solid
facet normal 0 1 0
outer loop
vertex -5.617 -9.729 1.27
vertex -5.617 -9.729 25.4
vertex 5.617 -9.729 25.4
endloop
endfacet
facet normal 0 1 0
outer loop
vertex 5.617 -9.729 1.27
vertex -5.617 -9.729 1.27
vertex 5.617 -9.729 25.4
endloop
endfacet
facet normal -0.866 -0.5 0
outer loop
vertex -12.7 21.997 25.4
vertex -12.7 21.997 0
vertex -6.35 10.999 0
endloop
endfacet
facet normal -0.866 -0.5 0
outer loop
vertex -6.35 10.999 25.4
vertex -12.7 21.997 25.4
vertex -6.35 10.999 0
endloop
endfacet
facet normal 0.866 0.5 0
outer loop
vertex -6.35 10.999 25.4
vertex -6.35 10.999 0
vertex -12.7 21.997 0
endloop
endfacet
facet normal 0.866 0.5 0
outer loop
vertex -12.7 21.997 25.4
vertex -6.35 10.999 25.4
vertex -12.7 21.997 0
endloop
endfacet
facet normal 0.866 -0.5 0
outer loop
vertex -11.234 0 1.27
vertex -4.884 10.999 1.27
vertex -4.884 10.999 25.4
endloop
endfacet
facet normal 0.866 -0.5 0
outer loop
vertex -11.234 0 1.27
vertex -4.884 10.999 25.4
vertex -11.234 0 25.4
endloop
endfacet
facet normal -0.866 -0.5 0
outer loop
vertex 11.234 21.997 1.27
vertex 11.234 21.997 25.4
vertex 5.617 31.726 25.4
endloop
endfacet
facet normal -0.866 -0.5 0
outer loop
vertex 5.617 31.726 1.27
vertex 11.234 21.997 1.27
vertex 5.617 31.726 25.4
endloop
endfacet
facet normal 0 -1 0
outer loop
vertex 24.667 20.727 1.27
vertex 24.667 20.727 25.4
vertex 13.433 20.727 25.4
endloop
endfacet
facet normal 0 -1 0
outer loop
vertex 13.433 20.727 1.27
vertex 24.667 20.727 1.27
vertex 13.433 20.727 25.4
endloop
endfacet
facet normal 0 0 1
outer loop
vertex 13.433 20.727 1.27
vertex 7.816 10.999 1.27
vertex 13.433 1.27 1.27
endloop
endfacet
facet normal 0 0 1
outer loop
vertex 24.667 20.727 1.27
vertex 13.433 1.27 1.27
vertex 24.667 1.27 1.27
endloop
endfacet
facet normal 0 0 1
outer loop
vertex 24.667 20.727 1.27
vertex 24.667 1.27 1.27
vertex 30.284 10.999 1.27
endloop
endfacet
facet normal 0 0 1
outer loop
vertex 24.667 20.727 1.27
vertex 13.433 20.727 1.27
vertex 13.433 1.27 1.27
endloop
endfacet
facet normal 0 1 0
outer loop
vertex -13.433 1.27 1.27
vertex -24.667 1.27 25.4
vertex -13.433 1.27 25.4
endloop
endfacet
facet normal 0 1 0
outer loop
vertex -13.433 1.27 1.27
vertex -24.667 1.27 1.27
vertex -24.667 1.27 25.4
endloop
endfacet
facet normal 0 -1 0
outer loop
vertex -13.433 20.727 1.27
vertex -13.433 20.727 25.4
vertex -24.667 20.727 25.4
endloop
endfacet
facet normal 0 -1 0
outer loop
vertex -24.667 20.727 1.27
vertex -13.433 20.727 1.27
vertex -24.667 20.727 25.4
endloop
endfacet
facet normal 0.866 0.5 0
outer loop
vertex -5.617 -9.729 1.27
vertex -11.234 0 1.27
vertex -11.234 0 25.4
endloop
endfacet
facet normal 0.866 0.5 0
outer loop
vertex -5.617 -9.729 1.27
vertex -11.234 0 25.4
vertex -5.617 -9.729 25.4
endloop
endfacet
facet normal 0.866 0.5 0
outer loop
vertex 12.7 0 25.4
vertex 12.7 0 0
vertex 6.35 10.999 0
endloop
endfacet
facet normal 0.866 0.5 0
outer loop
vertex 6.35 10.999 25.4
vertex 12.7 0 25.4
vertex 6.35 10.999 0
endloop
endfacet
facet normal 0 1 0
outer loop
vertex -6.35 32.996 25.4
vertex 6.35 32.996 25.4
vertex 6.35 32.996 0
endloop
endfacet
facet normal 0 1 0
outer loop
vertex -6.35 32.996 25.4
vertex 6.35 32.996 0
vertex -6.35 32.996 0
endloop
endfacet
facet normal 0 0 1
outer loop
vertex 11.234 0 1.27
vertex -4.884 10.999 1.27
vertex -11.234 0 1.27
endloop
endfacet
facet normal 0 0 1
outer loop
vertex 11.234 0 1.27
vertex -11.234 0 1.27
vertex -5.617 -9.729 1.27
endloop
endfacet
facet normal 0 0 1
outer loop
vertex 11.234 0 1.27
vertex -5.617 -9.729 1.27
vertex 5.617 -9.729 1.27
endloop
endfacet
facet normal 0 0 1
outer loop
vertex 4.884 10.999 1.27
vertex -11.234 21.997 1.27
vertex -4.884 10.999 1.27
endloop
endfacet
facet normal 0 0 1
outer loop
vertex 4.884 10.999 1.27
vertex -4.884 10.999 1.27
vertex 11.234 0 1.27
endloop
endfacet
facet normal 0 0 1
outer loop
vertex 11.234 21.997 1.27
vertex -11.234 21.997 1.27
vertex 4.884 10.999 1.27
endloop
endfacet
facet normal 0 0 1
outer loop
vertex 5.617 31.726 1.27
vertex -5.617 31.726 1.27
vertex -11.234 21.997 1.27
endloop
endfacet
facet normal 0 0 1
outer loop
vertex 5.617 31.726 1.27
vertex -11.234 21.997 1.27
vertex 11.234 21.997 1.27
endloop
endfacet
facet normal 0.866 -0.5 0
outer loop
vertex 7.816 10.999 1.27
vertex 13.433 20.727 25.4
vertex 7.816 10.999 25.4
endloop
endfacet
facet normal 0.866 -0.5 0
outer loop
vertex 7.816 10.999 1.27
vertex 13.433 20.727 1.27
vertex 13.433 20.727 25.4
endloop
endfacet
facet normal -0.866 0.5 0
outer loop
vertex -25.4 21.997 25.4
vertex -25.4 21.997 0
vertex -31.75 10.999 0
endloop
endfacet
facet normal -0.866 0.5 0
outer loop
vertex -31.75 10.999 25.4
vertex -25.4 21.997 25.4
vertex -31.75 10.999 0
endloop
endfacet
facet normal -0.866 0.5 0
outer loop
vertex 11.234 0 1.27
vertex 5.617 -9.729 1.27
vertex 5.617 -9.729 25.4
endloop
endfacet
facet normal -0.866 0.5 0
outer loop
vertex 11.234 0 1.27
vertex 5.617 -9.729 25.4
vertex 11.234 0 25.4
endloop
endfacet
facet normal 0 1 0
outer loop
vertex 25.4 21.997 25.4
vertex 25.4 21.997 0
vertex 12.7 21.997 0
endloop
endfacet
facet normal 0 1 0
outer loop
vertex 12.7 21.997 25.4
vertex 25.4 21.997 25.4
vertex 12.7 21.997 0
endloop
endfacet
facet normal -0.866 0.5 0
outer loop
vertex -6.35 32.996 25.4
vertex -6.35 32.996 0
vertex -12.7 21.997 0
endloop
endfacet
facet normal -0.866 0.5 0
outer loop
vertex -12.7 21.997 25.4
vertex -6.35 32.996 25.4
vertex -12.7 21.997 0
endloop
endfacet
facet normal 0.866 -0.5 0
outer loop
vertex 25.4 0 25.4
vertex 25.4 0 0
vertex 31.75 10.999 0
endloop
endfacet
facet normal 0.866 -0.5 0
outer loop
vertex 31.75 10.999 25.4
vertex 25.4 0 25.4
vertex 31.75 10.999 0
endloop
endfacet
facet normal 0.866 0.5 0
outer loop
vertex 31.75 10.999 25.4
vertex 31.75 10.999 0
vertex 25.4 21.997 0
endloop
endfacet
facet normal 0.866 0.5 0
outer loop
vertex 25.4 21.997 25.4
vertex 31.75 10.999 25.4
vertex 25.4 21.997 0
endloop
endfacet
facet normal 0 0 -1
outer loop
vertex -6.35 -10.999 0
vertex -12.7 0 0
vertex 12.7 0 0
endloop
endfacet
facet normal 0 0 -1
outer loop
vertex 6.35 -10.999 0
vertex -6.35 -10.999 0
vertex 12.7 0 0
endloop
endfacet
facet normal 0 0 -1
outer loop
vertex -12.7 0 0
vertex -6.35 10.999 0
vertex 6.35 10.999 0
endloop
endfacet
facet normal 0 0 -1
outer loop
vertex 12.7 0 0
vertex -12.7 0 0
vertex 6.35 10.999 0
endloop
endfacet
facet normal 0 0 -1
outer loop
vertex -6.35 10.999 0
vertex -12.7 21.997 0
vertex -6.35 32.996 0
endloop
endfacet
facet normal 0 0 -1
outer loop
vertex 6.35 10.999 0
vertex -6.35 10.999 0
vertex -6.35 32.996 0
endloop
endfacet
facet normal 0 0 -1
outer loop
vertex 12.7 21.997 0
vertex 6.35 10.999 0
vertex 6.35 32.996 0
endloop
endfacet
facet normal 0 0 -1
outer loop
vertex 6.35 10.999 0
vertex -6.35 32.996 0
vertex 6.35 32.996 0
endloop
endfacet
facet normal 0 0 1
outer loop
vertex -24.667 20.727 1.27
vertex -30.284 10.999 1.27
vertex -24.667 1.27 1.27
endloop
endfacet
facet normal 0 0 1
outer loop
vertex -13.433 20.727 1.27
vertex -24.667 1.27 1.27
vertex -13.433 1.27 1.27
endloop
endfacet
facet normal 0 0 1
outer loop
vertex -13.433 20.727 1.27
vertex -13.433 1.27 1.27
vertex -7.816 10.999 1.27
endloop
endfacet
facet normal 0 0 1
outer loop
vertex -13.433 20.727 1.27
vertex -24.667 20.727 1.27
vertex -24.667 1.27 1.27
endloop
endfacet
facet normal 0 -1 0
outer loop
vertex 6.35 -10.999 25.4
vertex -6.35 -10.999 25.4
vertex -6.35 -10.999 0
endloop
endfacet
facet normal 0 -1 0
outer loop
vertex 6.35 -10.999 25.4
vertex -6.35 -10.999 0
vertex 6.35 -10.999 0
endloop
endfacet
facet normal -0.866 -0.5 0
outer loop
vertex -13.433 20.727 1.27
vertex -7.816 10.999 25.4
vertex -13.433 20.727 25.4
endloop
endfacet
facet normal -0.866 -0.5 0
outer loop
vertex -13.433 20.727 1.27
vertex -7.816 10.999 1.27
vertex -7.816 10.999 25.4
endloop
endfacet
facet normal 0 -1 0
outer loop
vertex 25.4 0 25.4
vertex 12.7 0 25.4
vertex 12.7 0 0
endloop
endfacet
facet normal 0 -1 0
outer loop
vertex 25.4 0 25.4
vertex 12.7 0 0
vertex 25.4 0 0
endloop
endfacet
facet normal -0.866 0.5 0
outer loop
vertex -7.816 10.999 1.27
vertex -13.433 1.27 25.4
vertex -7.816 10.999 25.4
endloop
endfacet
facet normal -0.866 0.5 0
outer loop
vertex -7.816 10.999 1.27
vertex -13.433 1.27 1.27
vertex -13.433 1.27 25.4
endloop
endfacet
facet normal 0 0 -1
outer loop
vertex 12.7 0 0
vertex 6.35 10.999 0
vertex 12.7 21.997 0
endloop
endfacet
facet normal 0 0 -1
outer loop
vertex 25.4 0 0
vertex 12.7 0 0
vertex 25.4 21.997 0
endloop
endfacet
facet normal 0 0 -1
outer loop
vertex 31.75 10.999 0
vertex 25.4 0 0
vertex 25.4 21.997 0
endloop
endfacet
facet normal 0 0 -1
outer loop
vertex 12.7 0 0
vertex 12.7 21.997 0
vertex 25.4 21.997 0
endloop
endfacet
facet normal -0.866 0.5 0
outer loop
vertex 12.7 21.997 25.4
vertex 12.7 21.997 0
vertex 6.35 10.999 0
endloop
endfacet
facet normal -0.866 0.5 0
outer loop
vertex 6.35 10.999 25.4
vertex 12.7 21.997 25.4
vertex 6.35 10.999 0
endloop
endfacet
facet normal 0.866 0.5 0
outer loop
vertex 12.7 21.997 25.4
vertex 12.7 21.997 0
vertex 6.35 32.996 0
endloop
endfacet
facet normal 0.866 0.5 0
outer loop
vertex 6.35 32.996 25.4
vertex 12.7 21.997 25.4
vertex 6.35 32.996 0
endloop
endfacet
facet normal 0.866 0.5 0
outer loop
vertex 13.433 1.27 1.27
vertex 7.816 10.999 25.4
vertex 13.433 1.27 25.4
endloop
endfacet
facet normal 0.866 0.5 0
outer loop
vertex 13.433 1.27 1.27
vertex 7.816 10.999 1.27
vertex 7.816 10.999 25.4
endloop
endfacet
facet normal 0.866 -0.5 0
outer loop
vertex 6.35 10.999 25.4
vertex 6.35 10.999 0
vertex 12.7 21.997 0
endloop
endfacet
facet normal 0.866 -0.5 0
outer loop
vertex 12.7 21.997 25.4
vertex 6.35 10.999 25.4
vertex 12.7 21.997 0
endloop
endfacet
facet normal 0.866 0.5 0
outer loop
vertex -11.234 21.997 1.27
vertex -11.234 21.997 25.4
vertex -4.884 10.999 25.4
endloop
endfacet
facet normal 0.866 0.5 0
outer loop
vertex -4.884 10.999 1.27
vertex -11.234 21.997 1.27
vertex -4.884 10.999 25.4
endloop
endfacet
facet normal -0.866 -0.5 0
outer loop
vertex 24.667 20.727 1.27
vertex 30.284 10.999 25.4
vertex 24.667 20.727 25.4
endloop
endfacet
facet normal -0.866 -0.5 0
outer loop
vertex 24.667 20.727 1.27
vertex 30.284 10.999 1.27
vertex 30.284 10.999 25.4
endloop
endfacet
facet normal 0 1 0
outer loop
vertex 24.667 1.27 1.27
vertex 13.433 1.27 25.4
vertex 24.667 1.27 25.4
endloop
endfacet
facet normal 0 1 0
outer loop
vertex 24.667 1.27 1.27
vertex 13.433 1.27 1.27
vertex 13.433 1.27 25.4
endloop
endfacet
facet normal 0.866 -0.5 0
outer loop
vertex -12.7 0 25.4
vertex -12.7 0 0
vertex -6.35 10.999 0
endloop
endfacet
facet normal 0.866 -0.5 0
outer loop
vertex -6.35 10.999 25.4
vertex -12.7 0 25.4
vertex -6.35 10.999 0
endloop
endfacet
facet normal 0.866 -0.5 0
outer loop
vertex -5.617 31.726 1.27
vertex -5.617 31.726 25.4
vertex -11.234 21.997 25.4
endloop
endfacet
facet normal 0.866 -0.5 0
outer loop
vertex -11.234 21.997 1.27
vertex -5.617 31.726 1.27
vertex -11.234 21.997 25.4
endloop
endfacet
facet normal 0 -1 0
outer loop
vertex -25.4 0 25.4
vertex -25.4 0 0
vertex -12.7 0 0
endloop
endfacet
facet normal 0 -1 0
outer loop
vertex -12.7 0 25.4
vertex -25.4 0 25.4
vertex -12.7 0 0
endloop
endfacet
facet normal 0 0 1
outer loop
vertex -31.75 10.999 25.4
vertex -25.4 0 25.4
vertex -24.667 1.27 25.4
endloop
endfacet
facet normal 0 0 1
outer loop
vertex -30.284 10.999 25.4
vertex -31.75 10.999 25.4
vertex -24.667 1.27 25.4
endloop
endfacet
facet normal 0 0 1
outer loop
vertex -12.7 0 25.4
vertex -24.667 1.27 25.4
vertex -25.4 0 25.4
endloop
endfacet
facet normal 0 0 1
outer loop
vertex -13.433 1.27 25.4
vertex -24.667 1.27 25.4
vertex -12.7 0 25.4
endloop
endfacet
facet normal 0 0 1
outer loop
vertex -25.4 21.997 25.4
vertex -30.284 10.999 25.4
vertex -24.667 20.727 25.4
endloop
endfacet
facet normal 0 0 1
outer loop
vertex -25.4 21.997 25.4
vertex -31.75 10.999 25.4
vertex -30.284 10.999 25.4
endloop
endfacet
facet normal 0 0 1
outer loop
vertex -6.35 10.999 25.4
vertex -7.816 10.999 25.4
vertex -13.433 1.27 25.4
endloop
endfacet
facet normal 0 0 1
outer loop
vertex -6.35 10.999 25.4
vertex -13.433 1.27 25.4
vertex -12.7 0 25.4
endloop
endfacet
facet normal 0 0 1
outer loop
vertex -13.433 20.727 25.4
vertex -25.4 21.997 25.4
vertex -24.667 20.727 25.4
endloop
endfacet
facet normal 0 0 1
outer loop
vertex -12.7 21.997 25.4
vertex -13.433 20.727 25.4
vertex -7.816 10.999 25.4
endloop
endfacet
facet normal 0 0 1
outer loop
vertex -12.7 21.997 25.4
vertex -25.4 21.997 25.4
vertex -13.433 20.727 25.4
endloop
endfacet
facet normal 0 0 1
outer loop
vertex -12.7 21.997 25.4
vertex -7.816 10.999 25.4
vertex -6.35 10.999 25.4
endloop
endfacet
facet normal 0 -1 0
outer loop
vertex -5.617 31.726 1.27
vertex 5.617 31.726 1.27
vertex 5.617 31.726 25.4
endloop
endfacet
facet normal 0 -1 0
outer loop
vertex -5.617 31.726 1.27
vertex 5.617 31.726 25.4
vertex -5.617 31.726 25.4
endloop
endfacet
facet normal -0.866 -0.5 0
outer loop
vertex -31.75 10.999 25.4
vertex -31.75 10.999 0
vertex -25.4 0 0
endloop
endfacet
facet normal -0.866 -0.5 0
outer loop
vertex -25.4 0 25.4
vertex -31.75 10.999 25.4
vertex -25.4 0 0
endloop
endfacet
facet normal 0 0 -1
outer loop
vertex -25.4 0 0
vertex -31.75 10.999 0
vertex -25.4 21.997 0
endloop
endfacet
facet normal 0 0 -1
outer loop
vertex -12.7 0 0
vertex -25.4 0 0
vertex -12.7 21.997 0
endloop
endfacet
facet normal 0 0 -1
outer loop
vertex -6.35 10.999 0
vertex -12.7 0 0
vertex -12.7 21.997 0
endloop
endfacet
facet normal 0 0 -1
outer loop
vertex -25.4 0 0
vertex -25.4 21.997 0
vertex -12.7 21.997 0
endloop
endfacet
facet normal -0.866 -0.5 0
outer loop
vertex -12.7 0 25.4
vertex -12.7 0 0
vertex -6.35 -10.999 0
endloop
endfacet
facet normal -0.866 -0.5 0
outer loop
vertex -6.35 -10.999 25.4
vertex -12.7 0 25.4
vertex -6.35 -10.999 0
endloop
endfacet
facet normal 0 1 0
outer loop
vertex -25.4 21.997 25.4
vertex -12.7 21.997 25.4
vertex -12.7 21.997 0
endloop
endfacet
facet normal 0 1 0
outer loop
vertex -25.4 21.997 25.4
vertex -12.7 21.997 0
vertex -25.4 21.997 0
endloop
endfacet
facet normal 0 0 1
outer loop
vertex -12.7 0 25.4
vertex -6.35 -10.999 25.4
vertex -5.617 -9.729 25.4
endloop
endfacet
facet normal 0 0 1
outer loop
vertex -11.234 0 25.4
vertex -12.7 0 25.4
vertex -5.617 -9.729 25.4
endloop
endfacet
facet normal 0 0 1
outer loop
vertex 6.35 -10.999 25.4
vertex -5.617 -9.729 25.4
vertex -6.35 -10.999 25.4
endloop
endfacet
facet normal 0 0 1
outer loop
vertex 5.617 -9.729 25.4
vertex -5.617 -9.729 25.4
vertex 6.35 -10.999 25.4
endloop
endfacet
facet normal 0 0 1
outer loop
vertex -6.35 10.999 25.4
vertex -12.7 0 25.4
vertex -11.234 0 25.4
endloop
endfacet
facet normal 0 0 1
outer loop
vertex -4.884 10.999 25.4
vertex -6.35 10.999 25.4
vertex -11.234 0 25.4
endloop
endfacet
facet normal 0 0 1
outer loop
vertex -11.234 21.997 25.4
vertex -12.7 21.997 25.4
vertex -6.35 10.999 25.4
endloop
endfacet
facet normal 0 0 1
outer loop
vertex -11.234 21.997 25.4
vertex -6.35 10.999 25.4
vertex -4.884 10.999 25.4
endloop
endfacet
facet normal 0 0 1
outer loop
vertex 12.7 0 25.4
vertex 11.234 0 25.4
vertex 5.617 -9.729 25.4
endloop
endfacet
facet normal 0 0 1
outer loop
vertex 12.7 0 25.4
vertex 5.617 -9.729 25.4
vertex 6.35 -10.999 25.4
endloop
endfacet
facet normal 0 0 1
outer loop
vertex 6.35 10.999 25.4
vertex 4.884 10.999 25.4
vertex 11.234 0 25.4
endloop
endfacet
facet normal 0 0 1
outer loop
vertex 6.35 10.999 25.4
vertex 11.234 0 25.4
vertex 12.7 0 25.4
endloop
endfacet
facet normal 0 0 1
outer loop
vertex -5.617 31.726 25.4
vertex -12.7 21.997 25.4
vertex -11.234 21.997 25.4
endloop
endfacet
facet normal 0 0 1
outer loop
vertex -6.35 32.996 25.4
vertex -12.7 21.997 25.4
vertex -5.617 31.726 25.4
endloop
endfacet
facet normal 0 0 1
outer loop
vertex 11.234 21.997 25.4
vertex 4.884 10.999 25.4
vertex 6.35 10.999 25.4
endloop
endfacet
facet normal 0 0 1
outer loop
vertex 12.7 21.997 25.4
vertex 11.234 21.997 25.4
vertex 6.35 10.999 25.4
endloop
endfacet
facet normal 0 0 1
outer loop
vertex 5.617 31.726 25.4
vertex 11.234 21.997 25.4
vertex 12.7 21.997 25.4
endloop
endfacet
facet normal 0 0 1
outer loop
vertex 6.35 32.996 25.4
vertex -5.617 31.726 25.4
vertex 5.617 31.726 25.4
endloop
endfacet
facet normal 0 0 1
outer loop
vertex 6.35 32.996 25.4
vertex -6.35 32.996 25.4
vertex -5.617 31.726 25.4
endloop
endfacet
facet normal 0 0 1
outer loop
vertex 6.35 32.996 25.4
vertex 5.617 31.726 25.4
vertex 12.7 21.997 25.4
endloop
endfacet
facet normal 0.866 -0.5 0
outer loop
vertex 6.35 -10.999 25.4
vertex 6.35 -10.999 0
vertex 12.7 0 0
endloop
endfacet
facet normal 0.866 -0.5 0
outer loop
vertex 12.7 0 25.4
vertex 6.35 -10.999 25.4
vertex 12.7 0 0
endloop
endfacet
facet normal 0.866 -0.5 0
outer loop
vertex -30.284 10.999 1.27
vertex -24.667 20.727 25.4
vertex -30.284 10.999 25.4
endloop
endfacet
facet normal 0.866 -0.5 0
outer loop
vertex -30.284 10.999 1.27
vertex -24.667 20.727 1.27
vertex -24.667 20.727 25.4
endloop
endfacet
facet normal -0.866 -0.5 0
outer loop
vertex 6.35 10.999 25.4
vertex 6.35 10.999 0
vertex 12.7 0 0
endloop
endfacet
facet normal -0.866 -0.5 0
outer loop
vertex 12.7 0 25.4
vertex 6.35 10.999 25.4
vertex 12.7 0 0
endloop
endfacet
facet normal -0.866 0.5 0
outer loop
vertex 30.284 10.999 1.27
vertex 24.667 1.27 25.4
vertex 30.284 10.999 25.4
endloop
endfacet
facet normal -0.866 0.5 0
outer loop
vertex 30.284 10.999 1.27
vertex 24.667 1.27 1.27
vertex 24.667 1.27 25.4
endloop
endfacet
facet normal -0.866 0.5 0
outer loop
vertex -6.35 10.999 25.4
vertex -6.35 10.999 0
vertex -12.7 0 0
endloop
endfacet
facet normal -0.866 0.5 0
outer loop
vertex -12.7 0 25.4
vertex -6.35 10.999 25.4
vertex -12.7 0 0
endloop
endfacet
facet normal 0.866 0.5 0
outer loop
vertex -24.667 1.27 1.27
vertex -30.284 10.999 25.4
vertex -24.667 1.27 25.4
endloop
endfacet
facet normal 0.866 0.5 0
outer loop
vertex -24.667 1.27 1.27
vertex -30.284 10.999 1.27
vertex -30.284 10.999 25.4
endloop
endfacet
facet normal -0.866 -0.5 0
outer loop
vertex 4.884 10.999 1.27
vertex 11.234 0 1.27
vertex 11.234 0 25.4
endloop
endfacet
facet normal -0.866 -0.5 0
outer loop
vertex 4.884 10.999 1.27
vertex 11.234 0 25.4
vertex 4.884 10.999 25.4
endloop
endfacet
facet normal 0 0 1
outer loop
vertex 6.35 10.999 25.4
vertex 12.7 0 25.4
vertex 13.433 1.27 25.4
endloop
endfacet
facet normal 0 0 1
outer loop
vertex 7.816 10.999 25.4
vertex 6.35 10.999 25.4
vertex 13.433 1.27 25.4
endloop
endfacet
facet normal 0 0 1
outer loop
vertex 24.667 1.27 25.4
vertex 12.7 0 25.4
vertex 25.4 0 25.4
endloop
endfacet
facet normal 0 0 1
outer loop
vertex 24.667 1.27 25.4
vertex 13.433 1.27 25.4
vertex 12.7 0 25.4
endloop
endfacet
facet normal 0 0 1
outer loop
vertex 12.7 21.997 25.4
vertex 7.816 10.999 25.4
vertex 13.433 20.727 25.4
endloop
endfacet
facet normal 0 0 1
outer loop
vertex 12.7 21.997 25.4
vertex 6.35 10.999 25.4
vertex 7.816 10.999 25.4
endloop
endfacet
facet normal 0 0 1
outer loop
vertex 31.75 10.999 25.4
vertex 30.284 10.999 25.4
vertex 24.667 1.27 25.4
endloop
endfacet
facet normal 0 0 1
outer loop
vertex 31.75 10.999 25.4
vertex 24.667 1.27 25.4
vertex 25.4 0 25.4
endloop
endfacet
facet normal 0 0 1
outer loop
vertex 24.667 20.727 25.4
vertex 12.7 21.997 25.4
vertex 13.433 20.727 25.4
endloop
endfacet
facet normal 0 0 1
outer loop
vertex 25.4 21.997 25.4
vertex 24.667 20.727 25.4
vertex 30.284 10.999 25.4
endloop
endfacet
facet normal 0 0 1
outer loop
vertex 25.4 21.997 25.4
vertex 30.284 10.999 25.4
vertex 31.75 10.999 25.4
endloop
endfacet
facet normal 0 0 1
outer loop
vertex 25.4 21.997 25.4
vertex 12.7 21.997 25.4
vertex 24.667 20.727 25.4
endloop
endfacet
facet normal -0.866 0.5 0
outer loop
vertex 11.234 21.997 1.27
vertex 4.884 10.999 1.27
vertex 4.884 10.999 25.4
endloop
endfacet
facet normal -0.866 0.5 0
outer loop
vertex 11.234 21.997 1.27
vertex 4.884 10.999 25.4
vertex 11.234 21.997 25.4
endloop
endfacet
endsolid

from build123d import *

# Parameters (mm, degrees)
F2_DEPTH = 25.4
F3_T     = -1.27
F3_2_T   = -1.27
F3_3_T   = -1.27


with BuildPart() as f2:
    # F1 (on Top) → F2 (new body)
    with BuildSketch(Plane.XY):
        Polygon((-12.7, 21.9970452561), (-25.4, 21.9970452561), (-31.75, 10.9985226281), (-25.4, 0), (-12.7, 0), (-6.35, 10.9985226281), align=None)
    extrude(amount=F2_DEPTH)

    # F3#2
    f3_2_openings = [f2.faces().sort_by_distance(p)[0] for p in [
        (-19.05, 10.998523, 25.4),
    ]]
    offset(amount=F3_2_T, openings=f3_2_openings)


with BuildPart() as f2b:
    # F1 (on Top) → F2, piece 2 (new body)
    with BuildSketch(Plane.XY):
        Polygon((12.7, 0), (25.4, 0), (31.75, 10.9985226281), (25.4, 21.9970452561), (12.7, 21.9970452561), (6.35, 10.9985226281), align=None)
    extrude(amount=F2_DEPTH)

    # F3#3
    f3_3_openings = [f2b.faces().sort_by_distance(p)[0] for p in [
        (19.05, 10.998523, 25.4),
    ]]
    offset(amount=F3_3_T, openings=f3_3_openings)


with BuildPart() as f2c:
    # F0 (on Top) → F2, piece 3 (new body)
    with BuildSketch(Plane.XY):
        Polygon((-6.35, 10.9985226281), (6.35, 10.9985226281), (12.7, 21.9970452561), (6.35, 32.9955678842), (-6.35, 32.9955678842), (-12.7, 21.9970452561), align=None)
        Polygon((6.35, -10.9985226281), (12.7, 0), (6.35, 10.9985226281), (-6.35, 10.9985226281), (-12.7, 0), (-6.35, -10.9985226281), align=None)
    extrude(amount=F2_DEPTH)

    # F3
    f3_openings = [f2c.faces().sort_by_distance(p)[0] for p in [
        (0, 10.998523, 25.4),
    ]]
    offset(amount=F3_T, openings=f3_openings, kind=Kind.INTERSECTION)


solid = Compound([f2.part, f2b.part, f2c.part])
